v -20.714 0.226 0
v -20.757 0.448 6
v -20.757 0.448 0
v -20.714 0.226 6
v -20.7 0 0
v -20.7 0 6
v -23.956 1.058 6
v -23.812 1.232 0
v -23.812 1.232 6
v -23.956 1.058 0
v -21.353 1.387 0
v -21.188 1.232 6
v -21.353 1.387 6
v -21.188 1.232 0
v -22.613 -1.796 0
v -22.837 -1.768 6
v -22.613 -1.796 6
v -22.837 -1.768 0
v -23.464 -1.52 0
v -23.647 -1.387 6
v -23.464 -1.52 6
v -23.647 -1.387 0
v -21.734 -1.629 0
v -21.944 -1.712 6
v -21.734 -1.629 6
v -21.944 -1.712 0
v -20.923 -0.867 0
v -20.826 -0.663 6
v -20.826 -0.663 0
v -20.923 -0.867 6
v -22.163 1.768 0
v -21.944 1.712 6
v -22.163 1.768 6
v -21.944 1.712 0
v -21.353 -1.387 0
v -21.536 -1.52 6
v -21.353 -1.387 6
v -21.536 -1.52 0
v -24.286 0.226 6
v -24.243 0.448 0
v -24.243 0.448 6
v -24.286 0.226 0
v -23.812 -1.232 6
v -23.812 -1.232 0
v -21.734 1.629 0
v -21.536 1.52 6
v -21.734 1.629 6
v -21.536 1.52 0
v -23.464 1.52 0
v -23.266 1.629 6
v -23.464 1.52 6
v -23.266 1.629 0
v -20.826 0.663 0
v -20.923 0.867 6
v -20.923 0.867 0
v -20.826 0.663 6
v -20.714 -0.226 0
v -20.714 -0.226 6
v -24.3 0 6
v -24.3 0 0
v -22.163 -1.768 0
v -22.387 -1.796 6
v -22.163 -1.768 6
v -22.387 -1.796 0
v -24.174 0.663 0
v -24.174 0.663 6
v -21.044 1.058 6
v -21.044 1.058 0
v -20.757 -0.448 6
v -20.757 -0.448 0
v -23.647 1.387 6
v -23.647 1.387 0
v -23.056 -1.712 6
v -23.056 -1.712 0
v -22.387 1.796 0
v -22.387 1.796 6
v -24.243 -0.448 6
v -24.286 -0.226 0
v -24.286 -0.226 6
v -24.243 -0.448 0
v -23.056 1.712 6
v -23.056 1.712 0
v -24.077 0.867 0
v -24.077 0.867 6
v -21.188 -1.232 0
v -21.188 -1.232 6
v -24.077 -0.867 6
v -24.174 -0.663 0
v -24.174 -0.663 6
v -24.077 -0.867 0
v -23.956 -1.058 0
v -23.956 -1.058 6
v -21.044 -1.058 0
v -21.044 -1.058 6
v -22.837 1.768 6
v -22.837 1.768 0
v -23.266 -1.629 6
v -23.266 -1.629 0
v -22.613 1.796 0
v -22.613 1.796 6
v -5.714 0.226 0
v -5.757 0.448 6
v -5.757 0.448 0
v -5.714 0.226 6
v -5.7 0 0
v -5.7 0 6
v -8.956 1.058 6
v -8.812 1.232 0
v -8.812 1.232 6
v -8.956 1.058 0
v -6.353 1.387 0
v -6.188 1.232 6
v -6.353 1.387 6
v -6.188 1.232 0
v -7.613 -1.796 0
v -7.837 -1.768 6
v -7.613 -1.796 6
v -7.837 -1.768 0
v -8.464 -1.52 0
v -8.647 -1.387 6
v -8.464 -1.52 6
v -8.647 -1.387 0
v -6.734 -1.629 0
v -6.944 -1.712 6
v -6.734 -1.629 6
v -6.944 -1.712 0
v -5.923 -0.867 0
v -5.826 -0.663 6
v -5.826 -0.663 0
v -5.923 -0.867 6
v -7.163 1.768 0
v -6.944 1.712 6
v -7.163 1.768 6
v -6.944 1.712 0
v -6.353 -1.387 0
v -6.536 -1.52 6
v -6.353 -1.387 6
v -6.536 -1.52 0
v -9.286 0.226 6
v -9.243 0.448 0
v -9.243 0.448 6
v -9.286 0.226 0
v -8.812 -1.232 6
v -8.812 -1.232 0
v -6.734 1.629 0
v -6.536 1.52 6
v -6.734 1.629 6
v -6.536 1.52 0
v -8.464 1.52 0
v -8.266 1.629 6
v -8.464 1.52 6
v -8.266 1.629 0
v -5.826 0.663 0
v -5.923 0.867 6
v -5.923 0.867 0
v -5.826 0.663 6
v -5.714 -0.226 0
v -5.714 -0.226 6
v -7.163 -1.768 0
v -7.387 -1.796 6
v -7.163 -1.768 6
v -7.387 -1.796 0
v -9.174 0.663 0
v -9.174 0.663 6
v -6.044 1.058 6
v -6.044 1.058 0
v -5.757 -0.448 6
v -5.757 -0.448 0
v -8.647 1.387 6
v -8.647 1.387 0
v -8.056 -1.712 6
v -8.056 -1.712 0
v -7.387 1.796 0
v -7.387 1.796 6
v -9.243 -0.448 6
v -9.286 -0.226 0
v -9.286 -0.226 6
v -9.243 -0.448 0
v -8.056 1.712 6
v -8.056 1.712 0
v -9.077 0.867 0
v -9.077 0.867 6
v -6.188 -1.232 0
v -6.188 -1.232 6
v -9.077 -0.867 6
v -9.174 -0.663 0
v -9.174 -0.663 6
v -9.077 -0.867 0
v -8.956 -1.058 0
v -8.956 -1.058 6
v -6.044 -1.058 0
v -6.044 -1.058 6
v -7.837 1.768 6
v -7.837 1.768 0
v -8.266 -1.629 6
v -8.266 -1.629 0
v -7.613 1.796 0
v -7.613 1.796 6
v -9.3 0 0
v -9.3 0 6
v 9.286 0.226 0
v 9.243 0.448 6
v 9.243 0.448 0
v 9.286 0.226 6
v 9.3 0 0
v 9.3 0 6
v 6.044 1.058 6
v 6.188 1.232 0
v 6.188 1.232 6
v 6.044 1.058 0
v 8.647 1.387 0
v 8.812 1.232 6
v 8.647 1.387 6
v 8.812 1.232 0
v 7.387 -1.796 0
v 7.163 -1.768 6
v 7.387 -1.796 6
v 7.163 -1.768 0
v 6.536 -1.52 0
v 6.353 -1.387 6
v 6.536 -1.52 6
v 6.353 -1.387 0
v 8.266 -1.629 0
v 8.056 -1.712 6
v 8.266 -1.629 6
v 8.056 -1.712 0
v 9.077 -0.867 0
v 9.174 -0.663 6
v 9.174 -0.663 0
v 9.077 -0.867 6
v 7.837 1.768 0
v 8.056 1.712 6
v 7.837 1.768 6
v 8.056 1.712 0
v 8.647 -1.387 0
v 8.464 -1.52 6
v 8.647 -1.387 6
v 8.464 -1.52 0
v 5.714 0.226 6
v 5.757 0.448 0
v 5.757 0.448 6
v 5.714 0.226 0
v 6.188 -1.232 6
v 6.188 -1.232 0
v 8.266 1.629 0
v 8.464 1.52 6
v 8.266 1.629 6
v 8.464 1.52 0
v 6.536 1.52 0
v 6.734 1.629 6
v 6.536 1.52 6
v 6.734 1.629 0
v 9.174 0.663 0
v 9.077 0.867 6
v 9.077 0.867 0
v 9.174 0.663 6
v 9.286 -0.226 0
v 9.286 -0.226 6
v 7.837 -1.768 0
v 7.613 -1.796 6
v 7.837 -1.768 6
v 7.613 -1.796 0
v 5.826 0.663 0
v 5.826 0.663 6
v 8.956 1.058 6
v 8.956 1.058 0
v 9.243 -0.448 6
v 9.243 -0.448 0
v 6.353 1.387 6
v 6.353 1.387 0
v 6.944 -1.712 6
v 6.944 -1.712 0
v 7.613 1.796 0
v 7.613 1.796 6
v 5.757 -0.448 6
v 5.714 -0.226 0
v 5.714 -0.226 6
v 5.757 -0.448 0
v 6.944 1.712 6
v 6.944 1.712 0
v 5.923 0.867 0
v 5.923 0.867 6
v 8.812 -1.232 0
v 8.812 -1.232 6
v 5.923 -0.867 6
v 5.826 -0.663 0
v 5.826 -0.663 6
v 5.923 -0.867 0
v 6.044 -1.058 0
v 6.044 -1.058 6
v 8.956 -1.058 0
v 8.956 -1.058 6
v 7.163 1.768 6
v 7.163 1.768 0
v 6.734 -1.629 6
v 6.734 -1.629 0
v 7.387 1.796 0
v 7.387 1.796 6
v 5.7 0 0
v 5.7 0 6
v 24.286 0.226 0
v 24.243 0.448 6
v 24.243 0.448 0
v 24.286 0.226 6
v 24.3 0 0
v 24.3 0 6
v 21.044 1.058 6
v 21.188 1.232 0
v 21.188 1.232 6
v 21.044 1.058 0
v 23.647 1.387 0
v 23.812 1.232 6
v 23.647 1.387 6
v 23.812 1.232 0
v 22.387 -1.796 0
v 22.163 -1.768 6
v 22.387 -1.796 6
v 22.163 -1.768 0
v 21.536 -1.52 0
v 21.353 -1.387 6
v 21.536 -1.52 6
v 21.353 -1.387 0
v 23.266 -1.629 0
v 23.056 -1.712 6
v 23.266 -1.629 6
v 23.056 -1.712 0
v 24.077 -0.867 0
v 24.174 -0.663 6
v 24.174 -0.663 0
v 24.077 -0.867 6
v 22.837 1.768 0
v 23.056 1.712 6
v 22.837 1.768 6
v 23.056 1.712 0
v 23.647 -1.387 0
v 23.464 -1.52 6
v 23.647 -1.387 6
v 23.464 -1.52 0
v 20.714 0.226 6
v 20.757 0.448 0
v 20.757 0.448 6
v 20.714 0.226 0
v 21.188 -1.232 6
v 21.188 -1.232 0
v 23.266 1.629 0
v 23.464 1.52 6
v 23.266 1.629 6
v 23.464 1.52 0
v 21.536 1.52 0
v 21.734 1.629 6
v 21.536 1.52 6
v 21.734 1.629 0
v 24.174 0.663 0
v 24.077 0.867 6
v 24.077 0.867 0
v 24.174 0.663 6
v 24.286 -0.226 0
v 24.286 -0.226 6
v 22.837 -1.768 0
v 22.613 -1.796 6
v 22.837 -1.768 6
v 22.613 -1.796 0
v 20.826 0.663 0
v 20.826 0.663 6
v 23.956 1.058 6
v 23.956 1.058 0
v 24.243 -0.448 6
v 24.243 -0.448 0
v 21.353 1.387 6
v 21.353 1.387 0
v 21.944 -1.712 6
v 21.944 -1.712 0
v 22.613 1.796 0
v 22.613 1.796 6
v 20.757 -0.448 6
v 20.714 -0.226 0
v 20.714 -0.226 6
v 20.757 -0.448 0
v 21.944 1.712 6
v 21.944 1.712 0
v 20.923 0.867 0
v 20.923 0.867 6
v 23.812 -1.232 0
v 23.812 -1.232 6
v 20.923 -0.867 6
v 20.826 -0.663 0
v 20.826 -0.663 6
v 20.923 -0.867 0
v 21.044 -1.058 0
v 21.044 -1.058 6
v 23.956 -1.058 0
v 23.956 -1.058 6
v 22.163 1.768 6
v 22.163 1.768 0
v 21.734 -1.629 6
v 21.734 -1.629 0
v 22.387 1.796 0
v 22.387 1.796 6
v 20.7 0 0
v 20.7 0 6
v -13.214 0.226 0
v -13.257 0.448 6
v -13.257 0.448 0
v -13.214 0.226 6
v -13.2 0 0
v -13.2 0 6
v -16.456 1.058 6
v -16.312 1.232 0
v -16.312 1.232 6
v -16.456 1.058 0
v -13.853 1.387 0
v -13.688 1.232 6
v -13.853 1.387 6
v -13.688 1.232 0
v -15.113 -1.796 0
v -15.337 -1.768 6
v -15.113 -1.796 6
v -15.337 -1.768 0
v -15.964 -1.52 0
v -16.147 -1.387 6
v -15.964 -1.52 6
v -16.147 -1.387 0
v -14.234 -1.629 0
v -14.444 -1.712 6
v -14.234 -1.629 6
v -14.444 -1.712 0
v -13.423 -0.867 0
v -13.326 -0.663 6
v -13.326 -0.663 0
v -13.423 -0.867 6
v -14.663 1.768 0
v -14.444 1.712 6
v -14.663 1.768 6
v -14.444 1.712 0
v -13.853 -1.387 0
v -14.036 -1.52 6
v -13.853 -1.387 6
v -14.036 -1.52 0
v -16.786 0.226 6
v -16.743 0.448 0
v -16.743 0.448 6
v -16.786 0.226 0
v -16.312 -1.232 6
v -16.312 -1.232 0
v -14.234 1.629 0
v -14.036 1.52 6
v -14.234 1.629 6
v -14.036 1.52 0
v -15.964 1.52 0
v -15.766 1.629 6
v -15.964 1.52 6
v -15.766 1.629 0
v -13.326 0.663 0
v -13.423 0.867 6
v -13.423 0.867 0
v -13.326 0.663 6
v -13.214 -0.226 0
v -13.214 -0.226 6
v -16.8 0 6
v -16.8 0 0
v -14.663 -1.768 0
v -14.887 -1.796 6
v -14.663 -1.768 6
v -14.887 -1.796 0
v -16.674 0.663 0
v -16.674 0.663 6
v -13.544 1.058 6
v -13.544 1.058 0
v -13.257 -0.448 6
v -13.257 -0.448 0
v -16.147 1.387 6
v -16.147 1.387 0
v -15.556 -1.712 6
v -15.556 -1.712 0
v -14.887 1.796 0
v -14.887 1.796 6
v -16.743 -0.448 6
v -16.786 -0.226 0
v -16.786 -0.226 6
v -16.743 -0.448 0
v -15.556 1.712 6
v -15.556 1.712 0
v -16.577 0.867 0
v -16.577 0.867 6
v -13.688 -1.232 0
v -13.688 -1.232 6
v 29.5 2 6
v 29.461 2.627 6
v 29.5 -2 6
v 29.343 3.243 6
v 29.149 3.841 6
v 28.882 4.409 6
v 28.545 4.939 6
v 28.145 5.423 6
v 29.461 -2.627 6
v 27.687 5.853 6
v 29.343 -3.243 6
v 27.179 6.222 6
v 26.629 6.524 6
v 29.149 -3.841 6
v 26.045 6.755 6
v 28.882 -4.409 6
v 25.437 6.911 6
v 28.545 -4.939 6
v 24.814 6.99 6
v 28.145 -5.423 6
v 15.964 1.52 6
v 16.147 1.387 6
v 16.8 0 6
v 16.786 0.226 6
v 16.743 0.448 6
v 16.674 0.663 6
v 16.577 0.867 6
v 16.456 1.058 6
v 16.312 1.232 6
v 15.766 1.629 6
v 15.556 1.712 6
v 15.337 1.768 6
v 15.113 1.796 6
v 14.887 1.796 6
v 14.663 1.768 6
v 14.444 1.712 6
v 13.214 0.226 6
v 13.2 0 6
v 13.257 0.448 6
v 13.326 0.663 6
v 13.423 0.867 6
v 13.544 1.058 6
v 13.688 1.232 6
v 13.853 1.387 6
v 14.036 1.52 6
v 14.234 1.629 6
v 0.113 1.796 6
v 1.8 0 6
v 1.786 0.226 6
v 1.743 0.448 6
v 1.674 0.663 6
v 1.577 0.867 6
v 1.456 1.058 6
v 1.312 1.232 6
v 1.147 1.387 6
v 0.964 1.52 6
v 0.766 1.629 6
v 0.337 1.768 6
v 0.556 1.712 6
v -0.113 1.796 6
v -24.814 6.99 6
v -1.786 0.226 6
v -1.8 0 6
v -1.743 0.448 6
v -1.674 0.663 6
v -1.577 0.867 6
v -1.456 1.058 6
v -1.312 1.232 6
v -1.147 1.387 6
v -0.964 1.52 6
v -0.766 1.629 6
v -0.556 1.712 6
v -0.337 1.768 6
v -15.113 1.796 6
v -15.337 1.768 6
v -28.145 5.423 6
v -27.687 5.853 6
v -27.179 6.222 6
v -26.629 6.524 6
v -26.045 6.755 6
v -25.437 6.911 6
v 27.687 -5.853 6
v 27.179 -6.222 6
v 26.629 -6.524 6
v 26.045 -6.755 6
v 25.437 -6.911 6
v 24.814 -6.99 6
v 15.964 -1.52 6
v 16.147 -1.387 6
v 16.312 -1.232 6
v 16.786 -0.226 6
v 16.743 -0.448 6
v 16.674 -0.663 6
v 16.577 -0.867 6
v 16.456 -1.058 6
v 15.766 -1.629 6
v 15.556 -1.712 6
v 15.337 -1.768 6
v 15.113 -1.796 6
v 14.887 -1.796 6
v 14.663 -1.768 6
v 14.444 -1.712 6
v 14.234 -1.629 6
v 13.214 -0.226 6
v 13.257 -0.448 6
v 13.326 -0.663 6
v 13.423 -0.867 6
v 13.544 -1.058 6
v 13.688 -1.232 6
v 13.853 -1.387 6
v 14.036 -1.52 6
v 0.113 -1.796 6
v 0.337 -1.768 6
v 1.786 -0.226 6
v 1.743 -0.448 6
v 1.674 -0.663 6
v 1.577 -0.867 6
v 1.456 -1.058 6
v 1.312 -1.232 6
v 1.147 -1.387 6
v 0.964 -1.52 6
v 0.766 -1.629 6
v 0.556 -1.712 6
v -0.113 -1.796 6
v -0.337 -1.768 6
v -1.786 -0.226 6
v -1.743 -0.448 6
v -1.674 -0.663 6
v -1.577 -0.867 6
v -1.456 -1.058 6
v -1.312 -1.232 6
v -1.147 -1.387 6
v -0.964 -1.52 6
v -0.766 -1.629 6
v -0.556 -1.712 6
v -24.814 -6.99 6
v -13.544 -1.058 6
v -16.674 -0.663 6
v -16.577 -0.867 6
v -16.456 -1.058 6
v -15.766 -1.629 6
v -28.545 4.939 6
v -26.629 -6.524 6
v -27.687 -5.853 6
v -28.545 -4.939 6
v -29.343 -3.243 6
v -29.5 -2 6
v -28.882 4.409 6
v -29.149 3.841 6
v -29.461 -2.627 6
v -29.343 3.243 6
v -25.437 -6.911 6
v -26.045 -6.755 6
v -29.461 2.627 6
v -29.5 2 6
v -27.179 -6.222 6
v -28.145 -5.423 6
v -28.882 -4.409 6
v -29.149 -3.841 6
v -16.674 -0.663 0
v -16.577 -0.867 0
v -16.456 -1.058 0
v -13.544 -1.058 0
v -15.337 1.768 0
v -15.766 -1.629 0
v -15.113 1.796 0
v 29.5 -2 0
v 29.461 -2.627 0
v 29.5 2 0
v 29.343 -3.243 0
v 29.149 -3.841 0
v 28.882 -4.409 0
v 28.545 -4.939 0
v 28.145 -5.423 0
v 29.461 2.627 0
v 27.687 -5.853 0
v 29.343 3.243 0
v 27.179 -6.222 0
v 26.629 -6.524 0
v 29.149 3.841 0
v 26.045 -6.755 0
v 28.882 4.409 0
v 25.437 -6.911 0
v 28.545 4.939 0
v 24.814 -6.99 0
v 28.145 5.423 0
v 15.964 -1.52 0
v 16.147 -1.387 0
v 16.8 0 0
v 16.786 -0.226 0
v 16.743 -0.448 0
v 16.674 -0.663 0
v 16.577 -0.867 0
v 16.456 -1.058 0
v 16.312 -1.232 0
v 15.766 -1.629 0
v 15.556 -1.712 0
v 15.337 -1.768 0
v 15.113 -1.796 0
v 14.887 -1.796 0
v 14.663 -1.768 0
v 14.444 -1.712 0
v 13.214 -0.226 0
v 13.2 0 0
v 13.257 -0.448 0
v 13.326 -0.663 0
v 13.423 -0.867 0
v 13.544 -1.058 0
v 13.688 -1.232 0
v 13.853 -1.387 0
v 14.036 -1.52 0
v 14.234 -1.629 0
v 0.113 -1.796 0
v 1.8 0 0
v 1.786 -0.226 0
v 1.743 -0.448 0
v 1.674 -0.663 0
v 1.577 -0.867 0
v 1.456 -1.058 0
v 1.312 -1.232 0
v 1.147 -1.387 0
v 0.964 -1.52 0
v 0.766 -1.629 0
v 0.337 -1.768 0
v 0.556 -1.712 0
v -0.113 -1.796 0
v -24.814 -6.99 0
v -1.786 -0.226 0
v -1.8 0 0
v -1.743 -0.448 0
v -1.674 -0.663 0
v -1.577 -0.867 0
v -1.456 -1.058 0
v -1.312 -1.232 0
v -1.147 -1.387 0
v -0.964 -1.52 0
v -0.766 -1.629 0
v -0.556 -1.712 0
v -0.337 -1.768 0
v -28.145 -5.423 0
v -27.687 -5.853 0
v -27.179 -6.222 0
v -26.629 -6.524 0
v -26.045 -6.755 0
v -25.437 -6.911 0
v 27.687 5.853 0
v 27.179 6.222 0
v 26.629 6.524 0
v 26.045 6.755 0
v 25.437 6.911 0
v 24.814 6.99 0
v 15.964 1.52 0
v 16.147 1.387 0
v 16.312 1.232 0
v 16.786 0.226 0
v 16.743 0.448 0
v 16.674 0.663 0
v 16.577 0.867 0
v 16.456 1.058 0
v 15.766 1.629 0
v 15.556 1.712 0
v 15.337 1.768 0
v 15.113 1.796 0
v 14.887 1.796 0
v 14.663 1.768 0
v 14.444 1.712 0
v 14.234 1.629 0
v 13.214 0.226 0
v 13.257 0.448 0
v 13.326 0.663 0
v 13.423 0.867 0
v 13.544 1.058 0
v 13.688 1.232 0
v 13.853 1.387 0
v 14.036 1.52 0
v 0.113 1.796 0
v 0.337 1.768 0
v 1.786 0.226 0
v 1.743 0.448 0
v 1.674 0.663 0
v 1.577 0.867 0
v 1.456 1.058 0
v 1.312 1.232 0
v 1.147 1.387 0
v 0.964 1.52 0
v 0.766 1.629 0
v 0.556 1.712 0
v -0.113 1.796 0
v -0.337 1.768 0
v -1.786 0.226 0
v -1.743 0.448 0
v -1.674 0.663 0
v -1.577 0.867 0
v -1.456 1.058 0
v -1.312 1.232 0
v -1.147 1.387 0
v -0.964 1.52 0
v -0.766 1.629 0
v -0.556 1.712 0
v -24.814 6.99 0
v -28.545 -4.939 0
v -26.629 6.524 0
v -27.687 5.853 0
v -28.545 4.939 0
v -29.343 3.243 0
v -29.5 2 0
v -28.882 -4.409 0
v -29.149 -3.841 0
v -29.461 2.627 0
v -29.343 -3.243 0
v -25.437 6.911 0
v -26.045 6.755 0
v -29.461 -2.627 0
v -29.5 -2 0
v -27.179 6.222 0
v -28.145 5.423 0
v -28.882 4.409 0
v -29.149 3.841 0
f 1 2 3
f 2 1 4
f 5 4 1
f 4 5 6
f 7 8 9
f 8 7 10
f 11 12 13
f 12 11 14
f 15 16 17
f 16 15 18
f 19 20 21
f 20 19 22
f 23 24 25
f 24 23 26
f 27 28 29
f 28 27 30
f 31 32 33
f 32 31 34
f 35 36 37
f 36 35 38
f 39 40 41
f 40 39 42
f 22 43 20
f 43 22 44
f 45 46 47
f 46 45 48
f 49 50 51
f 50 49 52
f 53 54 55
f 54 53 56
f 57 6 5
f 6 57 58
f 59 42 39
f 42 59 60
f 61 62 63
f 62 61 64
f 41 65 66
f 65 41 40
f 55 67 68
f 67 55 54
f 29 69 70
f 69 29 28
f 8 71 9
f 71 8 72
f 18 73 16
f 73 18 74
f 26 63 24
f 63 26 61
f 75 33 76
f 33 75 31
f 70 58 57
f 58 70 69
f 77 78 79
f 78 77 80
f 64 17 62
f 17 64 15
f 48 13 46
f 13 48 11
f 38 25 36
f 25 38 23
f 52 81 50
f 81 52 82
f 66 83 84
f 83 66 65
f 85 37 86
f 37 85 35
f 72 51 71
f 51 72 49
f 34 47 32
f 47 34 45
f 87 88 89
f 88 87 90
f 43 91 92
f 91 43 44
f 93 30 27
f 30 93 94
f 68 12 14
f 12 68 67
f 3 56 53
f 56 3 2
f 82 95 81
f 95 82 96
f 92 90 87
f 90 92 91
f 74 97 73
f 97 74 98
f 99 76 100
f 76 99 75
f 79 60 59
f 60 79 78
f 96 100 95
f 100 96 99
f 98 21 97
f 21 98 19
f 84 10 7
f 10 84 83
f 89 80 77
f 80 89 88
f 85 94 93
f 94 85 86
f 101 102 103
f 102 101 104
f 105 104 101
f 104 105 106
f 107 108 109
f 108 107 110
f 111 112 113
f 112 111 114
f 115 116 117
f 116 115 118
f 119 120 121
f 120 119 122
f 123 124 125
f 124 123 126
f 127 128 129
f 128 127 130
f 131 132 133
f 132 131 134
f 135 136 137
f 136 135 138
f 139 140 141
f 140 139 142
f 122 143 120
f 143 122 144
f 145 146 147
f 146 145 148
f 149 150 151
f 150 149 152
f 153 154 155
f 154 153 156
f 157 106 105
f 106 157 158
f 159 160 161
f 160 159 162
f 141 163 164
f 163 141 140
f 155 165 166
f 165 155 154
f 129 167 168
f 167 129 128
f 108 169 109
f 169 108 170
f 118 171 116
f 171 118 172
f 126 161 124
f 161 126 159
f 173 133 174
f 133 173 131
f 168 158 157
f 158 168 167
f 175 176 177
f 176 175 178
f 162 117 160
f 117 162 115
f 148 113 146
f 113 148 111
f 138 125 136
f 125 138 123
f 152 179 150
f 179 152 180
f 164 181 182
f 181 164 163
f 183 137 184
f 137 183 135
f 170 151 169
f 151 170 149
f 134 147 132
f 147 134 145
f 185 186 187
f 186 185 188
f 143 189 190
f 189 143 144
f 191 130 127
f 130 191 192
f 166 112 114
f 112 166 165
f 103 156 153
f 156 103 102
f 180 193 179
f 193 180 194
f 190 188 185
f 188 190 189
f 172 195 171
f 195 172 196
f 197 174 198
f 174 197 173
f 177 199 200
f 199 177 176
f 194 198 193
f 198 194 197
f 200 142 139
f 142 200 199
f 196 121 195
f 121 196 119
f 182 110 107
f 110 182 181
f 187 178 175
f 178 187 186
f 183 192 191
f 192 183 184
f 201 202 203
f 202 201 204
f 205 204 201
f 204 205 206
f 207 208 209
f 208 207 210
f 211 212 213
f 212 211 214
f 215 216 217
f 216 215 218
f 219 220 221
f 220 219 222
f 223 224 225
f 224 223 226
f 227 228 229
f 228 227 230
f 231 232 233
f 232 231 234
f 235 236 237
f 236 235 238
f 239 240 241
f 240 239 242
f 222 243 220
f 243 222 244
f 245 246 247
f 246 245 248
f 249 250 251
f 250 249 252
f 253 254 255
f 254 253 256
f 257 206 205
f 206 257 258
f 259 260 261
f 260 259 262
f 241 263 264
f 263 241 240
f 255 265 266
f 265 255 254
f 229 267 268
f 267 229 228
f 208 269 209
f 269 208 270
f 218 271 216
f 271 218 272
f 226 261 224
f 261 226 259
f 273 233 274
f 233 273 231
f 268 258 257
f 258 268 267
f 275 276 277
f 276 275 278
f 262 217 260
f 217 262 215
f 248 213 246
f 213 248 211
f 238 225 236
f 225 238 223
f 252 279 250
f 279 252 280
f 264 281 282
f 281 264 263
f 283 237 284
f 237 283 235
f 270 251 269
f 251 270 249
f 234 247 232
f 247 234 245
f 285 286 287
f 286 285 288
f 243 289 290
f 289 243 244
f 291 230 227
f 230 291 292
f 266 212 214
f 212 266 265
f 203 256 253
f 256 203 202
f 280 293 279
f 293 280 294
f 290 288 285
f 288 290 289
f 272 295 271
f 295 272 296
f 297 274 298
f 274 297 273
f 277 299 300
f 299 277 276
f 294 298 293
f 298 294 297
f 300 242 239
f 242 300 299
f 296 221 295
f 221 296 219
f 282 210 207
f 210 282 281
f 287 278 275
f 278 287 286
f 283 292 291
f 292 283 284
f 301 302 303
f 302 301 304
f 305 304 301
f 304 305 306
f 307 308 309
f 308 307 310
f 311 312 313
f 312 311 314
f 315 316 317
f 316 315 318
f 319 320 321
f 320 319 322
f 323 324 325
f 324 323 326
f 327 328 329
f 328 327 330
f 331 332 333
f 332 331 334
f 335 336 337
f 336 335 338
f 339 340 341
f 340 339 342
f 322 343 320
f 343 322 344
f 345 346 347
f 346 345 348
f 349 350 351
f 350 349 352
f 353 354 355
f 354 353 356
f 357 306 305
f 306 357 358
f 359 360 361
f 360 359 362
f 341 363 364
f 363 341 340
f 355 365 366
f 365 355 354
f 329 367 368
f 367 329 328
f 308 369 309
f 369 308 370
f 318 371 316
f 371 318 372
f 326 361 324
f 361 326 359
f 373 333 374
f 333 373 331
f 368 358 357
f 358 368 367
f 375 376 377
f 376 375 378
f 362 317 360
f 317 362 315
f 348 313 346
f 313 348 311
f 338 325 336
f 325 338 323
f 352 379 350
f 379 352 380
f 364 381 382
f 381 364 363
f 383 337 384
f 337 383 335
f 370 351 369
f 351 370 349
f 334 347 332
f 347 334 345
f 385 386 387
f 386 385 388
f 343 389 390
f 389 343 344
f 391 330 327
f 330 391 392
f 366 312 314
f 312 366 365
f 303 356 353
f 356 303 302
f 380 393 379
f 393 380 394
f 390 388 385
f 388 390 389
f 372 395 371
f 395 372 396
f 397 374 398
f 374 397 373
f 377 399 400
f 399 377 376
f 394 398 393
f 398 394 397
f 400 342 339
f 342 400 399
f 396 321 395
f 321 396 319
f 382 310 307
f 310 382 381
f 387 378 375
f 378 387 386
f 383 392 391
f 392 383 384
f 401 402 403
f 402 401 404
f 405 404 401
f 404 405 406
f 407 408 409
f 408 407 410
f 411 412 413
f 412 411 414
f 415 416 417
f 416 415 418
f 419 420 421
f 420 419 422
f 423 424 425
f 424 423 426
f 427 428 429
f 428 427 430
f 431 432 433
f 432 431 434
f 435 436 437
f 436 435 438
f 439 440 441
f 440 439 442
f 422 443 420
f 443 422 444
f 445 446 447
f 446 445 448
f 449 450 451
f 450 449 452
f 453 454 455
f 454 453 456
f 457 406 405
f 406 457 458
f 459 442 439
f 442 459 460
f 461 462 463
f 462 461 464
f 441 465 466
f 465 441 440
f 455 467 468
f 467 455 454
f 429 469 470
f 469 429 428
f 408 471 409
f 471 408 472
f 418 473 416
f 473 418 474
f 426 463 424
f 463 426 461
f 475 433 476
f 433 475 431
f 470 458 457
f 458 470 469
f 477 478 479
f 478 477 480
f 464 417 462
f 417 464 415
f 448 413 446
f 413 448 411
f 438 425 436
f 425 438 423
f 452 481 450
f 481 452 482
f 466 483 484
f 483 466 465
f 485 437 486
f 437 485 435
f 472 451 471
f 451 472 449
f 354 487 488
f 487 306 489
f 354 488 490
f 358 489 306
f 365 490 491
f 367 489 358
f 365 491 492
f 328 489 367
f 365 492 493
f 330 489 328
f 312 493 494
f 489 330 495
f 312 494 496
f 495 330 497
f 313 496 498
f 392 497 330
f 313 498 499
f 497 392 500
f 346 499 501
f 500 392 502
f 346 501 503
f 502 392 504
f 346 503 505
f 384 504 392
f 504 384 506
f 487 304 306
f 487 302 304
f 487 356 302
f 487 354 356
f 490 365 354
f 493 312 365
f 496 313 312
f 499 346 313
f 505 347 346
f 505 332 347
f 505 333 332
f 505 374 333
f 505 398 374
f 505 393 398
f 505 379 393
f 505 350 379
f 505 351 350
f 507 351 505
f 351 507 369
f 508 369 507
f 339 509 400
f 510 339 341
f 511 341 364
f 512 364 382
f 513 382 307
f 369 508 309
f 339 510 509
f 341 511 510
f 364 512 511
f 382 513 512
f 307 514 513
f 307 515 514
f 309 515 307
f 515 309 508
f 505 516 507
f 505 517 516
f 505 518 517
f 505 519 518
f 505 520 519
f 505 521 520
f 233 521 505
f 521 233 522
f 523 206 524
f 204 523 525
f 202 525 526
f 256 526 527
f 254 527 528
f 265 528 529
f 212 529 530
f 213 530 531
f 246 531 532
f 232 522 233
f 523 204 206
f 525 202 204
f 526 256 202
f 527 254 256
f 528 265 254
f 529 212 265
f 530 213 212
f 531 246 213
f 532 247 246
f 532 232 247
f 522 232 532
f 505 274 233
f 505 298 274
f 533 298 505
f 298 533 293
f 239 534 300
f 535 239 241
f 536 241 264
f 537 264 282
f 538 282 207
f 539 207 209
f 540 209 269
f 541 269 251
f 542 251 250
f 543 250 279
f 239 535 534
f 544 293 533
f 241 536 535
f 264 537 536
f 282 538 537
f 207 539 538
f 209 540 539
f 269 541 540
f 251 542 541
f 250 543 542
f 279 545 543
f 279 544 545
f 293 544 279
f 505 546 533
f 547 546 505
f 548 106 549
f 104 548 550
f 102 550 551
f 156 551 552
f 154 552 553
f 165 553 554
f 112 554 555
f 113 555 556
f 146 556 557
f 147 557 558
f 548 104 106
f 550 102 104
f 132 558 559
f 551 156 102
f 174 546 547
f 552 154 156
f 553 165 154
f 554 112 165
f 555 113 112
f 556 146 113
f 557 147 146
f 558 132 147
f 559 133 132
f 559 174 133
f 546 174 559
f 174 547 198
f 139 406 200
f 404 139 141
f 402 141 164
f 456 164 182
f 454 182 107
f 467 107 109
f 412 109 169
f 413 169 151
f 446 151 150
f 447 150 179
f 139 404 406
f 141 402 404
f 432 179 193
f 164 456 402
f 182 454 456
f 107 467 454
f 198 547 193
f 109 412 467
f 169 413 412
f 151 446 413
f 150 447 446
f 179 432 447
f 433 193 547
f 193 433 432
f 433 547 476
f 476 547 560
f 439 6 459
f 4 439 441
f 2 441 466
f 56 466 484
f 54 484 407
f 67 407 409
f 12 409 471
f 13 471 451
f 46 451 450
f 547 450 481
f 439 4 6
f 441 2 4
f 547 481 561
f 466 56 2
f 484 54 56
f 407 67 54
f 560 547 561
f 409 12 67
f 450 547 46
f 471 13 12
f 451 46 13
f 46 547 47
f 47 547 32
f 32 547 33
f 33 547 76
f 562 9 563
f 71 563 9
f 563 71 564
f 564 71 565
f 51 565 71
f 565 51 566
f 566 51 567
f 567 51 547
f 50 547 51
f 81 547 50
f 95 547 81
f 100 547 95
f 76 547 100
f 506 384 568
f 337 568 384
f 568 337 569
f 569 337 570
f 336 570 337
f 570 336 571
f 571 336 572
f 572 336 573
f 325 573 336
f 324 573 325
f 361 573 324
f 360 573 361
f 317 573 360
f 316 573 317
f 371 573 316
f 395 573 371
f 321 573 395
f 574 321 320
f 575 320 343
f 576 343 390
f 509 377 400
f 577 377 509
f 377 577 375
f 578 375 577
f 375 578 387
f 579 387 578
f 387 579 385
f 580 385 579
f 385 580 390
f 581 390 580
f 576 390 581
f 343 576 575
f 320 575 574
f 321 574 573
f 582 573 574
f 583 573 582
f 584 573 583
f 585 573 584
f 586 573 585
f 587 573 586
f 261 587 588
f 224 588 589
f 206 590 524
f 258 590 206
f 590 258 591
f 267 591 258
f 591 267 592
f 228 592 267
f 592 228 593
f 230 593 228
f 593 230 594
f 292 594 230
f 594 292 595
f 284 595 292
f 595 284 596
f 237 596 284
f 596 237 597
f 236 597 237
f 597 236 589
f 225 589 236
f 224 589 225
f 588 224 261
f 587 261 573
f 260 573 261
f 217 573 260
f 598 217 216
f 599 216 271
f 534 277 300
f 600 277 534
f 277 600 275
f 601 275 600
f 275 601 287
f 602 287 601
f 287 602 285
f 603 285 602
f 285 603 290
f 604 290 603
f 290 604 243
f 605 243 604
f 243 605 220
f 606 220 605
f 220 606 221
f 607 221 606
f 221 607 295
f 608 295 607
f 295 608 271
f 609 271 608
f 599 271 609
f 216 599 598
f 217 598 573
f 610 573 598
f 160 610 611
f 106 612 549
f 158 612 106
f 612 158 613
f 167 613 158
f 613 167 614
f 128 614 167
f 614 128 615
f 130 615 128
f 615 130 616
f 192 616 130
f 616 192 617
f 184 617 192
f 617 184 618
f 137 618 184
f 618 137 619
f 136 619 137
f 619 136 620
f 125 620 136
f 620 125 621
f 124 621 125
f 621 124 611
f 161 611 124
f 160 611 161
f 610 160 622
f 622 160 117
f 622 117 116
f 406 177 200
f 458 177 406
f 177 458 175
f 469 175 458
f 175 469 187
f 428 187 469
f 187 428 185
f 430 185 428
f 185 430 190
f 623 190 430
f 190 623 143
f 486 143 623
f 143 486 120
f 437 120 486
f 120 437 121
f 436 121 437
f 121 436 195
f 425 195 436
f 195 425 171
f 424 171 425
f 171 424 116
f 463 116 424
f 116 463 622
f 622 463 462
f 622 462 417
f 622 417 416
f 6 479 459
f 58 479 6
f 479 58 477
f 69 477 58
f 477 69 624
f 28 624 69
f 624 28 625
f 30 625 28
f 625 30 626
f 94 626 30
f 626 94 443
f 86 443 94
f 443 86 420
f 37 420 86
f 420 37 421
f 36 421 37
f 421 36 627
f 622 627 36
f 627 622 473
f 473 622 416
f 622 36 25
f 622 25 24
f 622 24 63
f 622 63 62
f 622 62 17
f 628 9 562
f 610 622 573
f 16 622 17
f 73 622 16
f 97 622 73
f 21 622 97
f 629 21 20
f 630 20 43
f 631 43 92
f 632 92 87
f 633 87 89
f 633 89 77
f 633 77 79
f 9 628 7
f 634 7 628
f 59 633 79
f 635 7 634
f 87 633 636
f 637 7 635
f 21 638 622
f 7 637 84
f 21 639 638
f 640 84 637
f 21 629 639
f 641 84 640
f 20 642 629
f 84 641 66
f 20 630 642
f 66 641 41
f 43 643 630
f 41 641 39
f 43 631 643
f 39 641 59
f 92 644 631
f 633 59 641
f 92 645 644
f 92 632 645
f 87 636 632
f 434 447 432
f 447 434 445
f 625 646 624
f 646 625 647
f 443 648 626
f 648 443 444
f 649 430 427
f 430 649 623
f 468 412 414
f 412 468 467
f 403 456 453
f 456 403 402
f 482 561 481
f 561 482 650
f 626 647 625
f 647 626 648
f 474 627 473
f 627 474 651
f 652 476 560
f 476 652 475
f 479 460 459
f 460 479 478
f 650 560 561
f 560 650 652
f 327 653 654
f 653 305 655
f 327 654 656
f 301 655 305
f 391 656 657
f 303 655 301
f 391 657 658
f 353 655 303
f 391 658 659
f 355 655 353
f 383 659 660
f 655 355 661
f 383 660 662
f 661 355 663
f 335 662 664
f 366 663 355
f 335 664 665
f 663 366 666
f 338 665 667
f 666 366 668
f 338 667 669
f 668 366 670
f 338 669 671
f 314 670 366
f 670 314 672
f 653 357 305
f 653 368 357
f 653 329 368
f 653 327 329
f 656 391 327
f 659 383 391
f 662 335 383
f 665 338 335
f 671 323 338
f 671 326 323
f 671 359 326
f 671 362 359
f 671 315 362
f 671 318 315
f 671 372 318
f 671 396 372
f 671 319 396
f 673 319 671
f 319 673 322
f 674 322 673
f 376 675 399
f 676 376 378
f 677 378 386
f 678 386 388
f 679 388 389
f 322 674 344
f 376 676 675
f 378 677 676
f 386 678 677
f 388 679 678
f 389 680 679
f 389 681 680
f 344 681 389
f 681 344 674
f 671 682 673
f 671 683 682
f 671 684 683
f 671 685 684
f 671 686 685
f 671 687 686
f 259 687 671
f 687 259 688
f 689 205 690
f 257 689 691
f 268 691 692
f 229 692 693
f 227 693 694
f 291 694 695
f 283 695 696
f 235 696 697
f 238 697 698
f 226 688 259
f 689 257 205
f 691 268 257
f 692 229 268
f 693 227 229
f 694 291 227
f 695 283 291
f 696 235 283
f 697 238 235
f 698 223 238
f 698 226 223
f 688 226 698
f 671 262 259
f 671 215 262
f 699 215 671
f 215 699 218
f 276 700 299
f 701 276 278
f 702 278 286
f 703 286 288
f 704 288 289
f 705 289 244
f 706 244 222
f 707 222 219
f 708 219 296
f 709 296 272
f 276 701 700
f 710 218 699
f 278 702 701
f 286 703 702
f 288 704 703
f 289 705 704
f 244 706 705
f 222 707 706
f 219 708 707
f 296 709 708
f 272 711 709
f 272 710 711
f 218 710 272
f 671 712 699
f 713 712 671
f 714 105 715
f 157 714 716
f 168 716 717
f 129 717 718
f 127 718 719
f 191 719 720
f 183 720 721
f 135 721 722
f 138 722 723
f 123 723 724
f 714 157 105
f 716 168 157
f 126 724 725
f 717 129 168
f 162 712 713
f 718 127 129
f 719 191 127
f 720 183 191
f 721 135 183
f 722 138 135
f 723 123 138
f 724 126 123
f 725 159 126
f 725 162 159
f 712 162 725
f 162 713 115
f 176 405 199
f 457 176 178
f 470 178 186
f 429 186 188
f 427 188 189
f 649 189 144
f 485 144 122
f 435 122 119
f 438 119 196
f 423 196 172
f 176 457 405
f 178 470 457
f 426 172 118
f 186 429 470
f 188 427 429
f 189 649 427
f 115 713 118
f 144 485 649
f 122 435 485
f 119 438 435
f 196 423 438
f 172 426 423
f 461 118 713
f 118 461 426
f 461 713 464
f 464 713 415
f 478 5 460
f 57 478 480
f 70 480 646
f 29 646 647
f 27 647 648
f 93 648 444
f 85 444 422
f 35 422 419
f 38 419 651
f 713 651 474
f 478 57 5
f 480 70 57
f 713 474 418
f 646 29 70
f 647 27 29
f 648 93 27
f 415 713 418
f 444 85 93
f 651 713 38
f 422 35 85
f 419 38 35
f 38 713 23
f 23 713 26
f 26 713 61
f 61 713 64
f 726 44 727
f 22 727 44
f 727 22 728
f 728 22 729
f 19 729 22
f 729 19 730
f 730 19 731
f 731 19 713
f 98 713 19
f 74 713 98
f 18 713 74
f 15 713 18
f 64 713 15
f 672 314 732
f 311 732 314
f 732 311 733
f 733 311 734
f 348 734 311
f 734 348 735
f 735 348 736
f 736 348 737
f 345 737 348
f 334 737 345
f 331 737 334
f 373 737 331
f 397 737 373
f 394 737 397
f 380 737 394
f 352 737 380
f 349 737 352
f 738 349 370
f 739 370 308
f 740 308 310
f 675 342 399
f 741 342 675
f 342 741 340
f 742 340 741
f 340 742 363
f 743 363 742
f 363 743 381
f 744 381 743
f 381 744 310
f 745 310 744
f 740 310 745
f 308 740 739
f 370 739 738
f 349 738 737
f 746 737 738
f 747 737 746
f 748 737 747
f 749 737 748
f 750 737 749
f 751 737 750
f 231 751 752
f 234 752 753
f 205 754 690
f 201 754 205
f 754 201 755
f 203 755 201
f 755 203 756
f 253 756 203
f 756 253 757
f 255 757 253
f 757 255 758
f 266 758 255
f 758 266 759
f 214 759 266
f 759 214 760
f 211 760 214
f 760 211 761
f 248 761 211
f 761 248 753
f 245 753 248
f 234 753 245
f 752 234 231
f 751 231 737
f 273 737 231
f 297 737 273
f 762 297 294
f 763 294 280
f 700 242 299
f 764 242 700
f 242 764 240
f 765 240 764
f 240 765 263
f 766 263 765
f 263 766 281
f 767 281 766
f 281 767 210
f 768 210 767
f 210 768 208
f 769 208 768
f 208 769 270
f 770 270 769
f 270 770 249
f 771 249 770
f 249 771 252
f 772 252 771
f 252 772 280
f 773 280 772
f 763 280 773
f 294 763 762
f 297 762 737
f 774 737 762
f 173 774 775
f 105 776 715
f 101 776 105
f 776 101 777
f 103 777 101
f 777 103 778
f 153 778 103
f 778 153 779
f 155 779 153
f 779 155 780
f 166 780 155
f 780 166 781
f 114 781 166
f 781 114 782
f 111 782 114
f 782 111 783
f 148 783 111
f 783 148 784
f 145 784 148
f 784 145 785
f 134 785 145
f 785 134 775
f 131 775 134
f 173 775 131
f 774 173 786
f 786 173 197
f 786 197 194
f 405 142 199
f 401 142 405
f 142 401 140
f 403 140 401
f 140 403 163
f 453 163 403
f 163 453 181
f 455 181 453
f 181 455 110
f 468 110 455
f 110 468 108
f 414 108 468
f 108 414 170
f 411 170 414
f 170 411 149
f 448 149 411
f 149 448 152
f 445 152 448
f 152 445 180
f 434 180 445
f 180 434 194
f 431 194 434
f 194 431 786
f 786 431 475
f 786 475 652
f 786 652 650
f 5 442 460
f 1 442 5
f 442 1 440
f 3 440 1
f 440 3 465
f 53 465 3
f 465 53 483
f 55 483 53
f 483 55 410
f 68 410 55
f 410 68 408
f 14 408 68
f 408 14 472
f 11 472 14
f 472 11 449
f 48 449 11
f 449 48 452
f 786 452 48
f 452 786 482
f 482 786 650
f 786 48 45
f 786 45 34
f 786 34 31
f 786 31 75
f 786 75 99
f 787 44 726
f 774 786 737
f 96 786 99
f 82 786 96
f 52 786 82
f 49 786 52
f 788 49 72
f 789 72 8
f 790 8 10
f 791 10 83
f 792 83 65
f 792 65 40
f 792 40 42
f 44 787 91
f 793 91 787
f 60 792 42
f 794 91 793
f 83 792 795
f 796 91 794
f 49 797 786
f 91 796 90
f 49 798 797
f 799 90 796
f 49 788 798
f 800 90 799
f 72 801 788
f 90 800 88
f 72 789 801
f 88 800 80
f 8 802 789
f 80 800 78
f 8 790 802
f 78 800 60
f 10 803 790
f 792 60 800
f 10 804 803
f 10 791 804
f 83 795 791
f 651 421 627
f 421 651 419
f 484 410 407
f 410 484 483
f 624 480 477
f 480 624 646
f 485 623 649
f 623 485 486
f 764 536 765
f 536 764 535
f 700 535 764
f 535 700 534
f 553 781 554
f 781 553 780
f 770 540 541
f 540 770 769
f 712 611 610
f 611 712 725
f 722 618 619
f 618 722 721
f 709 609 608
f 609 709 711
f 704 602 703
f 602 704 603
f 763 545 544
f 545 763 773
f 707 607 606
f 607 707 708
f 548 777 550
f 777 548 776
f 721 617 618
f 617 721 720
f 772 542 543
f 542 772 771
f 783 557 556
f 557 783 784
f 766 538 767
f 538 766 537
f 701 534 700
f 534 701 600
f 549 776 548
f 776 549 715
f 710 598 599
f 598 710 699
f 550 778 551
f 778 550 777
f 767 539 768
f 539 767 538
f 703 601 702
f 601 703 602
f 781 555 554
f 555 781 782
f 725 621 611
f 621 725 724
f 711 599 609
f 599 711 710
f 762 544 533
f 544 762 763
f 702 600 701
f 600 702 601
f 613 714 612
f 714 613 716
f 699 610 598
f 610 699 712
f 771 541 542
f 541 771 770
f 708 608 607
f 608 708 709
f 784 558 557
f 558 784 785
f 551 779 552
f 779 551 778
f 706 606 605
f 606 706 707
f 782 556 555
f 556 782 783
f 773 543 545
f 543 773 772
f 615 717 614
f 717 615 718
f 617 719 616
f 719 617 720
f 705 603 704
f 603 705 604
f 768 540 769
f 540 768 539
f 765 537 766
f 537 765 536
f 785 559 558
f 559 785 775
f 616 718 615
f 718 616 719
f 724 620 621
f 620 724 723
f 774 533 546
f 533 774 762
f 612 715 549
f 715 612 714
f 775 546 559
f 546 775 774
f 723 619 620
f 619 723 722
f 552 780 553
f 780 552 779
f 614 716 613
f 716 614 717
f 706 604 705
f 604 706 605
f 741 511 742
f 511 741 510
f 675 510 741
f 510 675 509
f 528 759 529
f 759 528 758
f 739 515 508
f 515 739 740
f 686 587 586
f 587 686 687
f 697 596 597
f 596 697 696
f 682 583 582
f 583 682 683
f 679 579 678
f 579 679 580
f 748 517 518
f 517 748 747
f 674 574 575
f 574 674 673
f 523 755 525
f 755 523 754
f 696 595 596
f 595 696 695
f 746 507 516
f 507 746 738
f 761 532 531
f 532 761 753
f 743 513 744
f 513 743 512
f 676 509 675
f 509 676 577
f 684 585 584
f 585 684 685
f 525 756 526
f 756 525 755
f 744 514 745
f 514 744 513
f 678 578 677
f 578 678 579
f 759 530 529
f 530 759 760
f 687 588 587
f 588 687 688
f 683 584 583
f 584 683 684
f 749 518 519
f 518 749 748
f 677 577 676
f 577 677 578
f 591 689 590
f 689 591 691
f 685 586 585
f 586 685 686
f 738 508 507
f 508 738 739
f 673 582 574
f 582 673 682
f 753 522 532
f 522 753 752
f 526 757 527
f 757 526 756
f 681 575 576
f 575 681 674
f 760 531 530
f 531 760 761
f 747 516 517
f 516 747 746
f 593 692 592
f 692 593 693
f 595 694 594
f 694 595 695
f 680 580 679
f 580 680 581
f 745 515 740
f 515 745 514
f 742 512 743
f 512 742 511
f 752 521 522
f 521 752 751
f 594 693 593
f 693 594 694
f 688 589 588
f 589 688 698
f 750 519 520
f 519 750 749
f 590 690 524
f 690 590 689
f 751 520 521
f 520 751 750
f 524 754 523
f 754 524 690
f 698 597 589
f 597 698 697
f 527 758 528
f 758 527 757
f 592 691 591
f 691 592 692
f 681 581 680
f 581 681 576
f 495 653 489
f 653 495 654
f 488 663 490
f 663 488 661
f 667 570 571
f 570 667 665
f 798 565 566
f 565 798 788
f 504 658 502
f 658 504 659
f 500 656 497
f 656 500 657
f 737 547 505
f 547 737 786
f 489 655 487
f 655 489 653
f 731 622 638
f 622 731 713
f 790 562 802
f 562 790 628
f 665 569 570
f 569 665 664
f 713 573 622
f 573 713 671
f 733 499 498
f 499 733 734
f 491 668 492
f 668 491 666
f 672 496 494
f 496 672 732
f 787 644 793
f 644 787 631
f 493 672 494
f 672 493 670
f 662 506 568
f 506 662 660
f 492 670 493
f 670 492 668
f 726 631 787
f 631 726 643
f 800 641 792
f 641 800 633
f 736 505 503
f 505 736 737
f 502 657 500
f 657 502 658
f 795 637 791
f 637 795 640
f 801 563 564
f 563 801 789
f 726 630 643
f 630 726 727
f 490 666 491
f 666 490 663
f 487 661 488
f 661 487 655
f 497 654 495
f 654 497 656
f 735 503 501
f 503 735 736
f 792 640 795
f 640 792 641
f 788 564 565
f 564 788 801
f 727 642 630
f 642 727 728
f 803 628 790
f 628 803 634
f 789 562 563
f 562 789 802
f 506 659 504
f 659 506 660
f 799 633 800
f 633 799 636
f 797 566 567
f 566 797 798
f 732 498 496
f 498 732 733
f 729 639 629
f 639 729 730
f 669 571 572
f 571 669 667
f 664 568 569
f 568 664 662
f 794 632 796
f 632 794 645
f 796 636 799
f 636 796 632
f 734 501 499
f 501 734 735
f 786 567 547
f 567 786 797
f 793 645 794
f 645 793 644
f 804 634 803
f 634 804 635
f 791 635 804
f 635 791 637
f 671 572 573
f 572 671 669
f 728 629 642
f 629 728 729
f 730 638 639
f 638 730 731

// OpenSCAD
$fn = 50;


difference() {
	union() {
		hull() {
			translate(v = [-24.5000000000, 2.0000000000, 0]) {
				cylinder(h = 6, r = 5);
			}
			translate(v = [24.5000000000, 2.0000000000, 0]) {
				cylinder(h = 6, r = 5);
			}
			translate(v = [-24.5000000000, -2.0000000000, 0]) {
				cylinder(h = 6, r = 5);
			}
			translate(v = [24.5000000000, -2.0000000000, 0]) {
				cylinder(h = 6, r = 5);
			}
		}
	}
	union() {
		translate(v = [-22.5000000000, 0.0000000000, -100.0000000000]) {
			cylinder(h = 200, r = 1.8000000000);
		}
		translate(v = [-7.5000000000, 0.0000000000, -100.0000000000]) {
			cylinder(h = 200, r = 1.8000000000);
		}
		translate(v = [7.5000000000, 0.0000000000, -100.0000000000]) {
			cylinder(h = 200, r = 1.8000000000);
		}
		translate(v = [22.5000000000, 0.0000000000, -100.0000000000]) {
			cylinder(h = 200, r = 1.8000000000);
		}
		translate(v = [-22.5000000000, 0.0000000000, 0]) {
			cylinder(h = 6, r = 1.8000000000);
		}
		translate(v = [-15.0000000000, 0.0000000000, 0]) {
			cylinder(h = 6, r = 1.8000000000);
		}
		translate(v = [-7.5000000000, 0.0000000000, 0]) {
			cylinder(h = 6, r = 1.8000000000);
		}
		cylinder(h = 6, r = 1.8000000000);
		translate(v = [7.5000000000, 0.0000000000, 0]) {
			cylinder(h = 6, r = 1.8000000000);
		}
		translate(v = [15.0000000000, 0.0000000000, 0]) {
			cylinder(h = 6, r = 1.8000000000);
		}
		translate(v = [22.5000000000, 0.0000000000, 0]) {
			cylinder(h = 6, r = 1.8000000000);
		}
		translate(v = [-22.5000000000, 0.0000000000, 0]) {
			cylinder(h = 6, r = 1.8000000000);
		}
		translate(v = [-15.0000000000, 0.0000000000, 0]) {
			cylinder(h = 6, r = 1.8000000000);
		}
		translate(v = [-7.5000000000, 0.0000000000, 0]) {
			cylinder(h = 6, r = 1.8000000000);
		}
		cylinder(h = 6, r = 1.8000000000);
		translate(v = [7.5000000000, 0.0000000000, 0]) {
			cylinder(h = 6, r = 1.8000000000);
		}
		translate(v = [15.0000000000, 0.0000000000, 0]) {
			cylinder(h = 6, r = 1.8000000000);
		}
		translate(v = [22.5000000000, 0.0000000000, 0]) {
			cylinder(h = 6, r = 1.8000000000);
		}
		translate(v = [-22.5000000000, 0.0000000000, 0]) {
			cylinder(h = 6, r = 1.8000000000);
		}
		translate(v = [-15.0000000000, 0.0000000000, 0]) {
			cylinder(h = 6, r = 1.8000000000);
		}
		translate(v = [-7.5000000000, 0.0000000000, 0]) {
			cylinder(h = 6, r = 1.8000000000);
		}
		cylinder(h = 6, r = 1.8000000000);
		translate(v = [7.5000000000, 0.0000000000, 0]) {
			cylinder(h = 6, r = 1.8000000000);
		}
		translate(v = [15.0000000000, 0.0000000000, 0]) {
			cylinder(h = 6, r = 1.8000000000);
		}
		translate(v = [22.5000000000, 0.0000000000, 0]) {
			cylinder(h = 6, r = 1.8000000000);
		}
	}
}
